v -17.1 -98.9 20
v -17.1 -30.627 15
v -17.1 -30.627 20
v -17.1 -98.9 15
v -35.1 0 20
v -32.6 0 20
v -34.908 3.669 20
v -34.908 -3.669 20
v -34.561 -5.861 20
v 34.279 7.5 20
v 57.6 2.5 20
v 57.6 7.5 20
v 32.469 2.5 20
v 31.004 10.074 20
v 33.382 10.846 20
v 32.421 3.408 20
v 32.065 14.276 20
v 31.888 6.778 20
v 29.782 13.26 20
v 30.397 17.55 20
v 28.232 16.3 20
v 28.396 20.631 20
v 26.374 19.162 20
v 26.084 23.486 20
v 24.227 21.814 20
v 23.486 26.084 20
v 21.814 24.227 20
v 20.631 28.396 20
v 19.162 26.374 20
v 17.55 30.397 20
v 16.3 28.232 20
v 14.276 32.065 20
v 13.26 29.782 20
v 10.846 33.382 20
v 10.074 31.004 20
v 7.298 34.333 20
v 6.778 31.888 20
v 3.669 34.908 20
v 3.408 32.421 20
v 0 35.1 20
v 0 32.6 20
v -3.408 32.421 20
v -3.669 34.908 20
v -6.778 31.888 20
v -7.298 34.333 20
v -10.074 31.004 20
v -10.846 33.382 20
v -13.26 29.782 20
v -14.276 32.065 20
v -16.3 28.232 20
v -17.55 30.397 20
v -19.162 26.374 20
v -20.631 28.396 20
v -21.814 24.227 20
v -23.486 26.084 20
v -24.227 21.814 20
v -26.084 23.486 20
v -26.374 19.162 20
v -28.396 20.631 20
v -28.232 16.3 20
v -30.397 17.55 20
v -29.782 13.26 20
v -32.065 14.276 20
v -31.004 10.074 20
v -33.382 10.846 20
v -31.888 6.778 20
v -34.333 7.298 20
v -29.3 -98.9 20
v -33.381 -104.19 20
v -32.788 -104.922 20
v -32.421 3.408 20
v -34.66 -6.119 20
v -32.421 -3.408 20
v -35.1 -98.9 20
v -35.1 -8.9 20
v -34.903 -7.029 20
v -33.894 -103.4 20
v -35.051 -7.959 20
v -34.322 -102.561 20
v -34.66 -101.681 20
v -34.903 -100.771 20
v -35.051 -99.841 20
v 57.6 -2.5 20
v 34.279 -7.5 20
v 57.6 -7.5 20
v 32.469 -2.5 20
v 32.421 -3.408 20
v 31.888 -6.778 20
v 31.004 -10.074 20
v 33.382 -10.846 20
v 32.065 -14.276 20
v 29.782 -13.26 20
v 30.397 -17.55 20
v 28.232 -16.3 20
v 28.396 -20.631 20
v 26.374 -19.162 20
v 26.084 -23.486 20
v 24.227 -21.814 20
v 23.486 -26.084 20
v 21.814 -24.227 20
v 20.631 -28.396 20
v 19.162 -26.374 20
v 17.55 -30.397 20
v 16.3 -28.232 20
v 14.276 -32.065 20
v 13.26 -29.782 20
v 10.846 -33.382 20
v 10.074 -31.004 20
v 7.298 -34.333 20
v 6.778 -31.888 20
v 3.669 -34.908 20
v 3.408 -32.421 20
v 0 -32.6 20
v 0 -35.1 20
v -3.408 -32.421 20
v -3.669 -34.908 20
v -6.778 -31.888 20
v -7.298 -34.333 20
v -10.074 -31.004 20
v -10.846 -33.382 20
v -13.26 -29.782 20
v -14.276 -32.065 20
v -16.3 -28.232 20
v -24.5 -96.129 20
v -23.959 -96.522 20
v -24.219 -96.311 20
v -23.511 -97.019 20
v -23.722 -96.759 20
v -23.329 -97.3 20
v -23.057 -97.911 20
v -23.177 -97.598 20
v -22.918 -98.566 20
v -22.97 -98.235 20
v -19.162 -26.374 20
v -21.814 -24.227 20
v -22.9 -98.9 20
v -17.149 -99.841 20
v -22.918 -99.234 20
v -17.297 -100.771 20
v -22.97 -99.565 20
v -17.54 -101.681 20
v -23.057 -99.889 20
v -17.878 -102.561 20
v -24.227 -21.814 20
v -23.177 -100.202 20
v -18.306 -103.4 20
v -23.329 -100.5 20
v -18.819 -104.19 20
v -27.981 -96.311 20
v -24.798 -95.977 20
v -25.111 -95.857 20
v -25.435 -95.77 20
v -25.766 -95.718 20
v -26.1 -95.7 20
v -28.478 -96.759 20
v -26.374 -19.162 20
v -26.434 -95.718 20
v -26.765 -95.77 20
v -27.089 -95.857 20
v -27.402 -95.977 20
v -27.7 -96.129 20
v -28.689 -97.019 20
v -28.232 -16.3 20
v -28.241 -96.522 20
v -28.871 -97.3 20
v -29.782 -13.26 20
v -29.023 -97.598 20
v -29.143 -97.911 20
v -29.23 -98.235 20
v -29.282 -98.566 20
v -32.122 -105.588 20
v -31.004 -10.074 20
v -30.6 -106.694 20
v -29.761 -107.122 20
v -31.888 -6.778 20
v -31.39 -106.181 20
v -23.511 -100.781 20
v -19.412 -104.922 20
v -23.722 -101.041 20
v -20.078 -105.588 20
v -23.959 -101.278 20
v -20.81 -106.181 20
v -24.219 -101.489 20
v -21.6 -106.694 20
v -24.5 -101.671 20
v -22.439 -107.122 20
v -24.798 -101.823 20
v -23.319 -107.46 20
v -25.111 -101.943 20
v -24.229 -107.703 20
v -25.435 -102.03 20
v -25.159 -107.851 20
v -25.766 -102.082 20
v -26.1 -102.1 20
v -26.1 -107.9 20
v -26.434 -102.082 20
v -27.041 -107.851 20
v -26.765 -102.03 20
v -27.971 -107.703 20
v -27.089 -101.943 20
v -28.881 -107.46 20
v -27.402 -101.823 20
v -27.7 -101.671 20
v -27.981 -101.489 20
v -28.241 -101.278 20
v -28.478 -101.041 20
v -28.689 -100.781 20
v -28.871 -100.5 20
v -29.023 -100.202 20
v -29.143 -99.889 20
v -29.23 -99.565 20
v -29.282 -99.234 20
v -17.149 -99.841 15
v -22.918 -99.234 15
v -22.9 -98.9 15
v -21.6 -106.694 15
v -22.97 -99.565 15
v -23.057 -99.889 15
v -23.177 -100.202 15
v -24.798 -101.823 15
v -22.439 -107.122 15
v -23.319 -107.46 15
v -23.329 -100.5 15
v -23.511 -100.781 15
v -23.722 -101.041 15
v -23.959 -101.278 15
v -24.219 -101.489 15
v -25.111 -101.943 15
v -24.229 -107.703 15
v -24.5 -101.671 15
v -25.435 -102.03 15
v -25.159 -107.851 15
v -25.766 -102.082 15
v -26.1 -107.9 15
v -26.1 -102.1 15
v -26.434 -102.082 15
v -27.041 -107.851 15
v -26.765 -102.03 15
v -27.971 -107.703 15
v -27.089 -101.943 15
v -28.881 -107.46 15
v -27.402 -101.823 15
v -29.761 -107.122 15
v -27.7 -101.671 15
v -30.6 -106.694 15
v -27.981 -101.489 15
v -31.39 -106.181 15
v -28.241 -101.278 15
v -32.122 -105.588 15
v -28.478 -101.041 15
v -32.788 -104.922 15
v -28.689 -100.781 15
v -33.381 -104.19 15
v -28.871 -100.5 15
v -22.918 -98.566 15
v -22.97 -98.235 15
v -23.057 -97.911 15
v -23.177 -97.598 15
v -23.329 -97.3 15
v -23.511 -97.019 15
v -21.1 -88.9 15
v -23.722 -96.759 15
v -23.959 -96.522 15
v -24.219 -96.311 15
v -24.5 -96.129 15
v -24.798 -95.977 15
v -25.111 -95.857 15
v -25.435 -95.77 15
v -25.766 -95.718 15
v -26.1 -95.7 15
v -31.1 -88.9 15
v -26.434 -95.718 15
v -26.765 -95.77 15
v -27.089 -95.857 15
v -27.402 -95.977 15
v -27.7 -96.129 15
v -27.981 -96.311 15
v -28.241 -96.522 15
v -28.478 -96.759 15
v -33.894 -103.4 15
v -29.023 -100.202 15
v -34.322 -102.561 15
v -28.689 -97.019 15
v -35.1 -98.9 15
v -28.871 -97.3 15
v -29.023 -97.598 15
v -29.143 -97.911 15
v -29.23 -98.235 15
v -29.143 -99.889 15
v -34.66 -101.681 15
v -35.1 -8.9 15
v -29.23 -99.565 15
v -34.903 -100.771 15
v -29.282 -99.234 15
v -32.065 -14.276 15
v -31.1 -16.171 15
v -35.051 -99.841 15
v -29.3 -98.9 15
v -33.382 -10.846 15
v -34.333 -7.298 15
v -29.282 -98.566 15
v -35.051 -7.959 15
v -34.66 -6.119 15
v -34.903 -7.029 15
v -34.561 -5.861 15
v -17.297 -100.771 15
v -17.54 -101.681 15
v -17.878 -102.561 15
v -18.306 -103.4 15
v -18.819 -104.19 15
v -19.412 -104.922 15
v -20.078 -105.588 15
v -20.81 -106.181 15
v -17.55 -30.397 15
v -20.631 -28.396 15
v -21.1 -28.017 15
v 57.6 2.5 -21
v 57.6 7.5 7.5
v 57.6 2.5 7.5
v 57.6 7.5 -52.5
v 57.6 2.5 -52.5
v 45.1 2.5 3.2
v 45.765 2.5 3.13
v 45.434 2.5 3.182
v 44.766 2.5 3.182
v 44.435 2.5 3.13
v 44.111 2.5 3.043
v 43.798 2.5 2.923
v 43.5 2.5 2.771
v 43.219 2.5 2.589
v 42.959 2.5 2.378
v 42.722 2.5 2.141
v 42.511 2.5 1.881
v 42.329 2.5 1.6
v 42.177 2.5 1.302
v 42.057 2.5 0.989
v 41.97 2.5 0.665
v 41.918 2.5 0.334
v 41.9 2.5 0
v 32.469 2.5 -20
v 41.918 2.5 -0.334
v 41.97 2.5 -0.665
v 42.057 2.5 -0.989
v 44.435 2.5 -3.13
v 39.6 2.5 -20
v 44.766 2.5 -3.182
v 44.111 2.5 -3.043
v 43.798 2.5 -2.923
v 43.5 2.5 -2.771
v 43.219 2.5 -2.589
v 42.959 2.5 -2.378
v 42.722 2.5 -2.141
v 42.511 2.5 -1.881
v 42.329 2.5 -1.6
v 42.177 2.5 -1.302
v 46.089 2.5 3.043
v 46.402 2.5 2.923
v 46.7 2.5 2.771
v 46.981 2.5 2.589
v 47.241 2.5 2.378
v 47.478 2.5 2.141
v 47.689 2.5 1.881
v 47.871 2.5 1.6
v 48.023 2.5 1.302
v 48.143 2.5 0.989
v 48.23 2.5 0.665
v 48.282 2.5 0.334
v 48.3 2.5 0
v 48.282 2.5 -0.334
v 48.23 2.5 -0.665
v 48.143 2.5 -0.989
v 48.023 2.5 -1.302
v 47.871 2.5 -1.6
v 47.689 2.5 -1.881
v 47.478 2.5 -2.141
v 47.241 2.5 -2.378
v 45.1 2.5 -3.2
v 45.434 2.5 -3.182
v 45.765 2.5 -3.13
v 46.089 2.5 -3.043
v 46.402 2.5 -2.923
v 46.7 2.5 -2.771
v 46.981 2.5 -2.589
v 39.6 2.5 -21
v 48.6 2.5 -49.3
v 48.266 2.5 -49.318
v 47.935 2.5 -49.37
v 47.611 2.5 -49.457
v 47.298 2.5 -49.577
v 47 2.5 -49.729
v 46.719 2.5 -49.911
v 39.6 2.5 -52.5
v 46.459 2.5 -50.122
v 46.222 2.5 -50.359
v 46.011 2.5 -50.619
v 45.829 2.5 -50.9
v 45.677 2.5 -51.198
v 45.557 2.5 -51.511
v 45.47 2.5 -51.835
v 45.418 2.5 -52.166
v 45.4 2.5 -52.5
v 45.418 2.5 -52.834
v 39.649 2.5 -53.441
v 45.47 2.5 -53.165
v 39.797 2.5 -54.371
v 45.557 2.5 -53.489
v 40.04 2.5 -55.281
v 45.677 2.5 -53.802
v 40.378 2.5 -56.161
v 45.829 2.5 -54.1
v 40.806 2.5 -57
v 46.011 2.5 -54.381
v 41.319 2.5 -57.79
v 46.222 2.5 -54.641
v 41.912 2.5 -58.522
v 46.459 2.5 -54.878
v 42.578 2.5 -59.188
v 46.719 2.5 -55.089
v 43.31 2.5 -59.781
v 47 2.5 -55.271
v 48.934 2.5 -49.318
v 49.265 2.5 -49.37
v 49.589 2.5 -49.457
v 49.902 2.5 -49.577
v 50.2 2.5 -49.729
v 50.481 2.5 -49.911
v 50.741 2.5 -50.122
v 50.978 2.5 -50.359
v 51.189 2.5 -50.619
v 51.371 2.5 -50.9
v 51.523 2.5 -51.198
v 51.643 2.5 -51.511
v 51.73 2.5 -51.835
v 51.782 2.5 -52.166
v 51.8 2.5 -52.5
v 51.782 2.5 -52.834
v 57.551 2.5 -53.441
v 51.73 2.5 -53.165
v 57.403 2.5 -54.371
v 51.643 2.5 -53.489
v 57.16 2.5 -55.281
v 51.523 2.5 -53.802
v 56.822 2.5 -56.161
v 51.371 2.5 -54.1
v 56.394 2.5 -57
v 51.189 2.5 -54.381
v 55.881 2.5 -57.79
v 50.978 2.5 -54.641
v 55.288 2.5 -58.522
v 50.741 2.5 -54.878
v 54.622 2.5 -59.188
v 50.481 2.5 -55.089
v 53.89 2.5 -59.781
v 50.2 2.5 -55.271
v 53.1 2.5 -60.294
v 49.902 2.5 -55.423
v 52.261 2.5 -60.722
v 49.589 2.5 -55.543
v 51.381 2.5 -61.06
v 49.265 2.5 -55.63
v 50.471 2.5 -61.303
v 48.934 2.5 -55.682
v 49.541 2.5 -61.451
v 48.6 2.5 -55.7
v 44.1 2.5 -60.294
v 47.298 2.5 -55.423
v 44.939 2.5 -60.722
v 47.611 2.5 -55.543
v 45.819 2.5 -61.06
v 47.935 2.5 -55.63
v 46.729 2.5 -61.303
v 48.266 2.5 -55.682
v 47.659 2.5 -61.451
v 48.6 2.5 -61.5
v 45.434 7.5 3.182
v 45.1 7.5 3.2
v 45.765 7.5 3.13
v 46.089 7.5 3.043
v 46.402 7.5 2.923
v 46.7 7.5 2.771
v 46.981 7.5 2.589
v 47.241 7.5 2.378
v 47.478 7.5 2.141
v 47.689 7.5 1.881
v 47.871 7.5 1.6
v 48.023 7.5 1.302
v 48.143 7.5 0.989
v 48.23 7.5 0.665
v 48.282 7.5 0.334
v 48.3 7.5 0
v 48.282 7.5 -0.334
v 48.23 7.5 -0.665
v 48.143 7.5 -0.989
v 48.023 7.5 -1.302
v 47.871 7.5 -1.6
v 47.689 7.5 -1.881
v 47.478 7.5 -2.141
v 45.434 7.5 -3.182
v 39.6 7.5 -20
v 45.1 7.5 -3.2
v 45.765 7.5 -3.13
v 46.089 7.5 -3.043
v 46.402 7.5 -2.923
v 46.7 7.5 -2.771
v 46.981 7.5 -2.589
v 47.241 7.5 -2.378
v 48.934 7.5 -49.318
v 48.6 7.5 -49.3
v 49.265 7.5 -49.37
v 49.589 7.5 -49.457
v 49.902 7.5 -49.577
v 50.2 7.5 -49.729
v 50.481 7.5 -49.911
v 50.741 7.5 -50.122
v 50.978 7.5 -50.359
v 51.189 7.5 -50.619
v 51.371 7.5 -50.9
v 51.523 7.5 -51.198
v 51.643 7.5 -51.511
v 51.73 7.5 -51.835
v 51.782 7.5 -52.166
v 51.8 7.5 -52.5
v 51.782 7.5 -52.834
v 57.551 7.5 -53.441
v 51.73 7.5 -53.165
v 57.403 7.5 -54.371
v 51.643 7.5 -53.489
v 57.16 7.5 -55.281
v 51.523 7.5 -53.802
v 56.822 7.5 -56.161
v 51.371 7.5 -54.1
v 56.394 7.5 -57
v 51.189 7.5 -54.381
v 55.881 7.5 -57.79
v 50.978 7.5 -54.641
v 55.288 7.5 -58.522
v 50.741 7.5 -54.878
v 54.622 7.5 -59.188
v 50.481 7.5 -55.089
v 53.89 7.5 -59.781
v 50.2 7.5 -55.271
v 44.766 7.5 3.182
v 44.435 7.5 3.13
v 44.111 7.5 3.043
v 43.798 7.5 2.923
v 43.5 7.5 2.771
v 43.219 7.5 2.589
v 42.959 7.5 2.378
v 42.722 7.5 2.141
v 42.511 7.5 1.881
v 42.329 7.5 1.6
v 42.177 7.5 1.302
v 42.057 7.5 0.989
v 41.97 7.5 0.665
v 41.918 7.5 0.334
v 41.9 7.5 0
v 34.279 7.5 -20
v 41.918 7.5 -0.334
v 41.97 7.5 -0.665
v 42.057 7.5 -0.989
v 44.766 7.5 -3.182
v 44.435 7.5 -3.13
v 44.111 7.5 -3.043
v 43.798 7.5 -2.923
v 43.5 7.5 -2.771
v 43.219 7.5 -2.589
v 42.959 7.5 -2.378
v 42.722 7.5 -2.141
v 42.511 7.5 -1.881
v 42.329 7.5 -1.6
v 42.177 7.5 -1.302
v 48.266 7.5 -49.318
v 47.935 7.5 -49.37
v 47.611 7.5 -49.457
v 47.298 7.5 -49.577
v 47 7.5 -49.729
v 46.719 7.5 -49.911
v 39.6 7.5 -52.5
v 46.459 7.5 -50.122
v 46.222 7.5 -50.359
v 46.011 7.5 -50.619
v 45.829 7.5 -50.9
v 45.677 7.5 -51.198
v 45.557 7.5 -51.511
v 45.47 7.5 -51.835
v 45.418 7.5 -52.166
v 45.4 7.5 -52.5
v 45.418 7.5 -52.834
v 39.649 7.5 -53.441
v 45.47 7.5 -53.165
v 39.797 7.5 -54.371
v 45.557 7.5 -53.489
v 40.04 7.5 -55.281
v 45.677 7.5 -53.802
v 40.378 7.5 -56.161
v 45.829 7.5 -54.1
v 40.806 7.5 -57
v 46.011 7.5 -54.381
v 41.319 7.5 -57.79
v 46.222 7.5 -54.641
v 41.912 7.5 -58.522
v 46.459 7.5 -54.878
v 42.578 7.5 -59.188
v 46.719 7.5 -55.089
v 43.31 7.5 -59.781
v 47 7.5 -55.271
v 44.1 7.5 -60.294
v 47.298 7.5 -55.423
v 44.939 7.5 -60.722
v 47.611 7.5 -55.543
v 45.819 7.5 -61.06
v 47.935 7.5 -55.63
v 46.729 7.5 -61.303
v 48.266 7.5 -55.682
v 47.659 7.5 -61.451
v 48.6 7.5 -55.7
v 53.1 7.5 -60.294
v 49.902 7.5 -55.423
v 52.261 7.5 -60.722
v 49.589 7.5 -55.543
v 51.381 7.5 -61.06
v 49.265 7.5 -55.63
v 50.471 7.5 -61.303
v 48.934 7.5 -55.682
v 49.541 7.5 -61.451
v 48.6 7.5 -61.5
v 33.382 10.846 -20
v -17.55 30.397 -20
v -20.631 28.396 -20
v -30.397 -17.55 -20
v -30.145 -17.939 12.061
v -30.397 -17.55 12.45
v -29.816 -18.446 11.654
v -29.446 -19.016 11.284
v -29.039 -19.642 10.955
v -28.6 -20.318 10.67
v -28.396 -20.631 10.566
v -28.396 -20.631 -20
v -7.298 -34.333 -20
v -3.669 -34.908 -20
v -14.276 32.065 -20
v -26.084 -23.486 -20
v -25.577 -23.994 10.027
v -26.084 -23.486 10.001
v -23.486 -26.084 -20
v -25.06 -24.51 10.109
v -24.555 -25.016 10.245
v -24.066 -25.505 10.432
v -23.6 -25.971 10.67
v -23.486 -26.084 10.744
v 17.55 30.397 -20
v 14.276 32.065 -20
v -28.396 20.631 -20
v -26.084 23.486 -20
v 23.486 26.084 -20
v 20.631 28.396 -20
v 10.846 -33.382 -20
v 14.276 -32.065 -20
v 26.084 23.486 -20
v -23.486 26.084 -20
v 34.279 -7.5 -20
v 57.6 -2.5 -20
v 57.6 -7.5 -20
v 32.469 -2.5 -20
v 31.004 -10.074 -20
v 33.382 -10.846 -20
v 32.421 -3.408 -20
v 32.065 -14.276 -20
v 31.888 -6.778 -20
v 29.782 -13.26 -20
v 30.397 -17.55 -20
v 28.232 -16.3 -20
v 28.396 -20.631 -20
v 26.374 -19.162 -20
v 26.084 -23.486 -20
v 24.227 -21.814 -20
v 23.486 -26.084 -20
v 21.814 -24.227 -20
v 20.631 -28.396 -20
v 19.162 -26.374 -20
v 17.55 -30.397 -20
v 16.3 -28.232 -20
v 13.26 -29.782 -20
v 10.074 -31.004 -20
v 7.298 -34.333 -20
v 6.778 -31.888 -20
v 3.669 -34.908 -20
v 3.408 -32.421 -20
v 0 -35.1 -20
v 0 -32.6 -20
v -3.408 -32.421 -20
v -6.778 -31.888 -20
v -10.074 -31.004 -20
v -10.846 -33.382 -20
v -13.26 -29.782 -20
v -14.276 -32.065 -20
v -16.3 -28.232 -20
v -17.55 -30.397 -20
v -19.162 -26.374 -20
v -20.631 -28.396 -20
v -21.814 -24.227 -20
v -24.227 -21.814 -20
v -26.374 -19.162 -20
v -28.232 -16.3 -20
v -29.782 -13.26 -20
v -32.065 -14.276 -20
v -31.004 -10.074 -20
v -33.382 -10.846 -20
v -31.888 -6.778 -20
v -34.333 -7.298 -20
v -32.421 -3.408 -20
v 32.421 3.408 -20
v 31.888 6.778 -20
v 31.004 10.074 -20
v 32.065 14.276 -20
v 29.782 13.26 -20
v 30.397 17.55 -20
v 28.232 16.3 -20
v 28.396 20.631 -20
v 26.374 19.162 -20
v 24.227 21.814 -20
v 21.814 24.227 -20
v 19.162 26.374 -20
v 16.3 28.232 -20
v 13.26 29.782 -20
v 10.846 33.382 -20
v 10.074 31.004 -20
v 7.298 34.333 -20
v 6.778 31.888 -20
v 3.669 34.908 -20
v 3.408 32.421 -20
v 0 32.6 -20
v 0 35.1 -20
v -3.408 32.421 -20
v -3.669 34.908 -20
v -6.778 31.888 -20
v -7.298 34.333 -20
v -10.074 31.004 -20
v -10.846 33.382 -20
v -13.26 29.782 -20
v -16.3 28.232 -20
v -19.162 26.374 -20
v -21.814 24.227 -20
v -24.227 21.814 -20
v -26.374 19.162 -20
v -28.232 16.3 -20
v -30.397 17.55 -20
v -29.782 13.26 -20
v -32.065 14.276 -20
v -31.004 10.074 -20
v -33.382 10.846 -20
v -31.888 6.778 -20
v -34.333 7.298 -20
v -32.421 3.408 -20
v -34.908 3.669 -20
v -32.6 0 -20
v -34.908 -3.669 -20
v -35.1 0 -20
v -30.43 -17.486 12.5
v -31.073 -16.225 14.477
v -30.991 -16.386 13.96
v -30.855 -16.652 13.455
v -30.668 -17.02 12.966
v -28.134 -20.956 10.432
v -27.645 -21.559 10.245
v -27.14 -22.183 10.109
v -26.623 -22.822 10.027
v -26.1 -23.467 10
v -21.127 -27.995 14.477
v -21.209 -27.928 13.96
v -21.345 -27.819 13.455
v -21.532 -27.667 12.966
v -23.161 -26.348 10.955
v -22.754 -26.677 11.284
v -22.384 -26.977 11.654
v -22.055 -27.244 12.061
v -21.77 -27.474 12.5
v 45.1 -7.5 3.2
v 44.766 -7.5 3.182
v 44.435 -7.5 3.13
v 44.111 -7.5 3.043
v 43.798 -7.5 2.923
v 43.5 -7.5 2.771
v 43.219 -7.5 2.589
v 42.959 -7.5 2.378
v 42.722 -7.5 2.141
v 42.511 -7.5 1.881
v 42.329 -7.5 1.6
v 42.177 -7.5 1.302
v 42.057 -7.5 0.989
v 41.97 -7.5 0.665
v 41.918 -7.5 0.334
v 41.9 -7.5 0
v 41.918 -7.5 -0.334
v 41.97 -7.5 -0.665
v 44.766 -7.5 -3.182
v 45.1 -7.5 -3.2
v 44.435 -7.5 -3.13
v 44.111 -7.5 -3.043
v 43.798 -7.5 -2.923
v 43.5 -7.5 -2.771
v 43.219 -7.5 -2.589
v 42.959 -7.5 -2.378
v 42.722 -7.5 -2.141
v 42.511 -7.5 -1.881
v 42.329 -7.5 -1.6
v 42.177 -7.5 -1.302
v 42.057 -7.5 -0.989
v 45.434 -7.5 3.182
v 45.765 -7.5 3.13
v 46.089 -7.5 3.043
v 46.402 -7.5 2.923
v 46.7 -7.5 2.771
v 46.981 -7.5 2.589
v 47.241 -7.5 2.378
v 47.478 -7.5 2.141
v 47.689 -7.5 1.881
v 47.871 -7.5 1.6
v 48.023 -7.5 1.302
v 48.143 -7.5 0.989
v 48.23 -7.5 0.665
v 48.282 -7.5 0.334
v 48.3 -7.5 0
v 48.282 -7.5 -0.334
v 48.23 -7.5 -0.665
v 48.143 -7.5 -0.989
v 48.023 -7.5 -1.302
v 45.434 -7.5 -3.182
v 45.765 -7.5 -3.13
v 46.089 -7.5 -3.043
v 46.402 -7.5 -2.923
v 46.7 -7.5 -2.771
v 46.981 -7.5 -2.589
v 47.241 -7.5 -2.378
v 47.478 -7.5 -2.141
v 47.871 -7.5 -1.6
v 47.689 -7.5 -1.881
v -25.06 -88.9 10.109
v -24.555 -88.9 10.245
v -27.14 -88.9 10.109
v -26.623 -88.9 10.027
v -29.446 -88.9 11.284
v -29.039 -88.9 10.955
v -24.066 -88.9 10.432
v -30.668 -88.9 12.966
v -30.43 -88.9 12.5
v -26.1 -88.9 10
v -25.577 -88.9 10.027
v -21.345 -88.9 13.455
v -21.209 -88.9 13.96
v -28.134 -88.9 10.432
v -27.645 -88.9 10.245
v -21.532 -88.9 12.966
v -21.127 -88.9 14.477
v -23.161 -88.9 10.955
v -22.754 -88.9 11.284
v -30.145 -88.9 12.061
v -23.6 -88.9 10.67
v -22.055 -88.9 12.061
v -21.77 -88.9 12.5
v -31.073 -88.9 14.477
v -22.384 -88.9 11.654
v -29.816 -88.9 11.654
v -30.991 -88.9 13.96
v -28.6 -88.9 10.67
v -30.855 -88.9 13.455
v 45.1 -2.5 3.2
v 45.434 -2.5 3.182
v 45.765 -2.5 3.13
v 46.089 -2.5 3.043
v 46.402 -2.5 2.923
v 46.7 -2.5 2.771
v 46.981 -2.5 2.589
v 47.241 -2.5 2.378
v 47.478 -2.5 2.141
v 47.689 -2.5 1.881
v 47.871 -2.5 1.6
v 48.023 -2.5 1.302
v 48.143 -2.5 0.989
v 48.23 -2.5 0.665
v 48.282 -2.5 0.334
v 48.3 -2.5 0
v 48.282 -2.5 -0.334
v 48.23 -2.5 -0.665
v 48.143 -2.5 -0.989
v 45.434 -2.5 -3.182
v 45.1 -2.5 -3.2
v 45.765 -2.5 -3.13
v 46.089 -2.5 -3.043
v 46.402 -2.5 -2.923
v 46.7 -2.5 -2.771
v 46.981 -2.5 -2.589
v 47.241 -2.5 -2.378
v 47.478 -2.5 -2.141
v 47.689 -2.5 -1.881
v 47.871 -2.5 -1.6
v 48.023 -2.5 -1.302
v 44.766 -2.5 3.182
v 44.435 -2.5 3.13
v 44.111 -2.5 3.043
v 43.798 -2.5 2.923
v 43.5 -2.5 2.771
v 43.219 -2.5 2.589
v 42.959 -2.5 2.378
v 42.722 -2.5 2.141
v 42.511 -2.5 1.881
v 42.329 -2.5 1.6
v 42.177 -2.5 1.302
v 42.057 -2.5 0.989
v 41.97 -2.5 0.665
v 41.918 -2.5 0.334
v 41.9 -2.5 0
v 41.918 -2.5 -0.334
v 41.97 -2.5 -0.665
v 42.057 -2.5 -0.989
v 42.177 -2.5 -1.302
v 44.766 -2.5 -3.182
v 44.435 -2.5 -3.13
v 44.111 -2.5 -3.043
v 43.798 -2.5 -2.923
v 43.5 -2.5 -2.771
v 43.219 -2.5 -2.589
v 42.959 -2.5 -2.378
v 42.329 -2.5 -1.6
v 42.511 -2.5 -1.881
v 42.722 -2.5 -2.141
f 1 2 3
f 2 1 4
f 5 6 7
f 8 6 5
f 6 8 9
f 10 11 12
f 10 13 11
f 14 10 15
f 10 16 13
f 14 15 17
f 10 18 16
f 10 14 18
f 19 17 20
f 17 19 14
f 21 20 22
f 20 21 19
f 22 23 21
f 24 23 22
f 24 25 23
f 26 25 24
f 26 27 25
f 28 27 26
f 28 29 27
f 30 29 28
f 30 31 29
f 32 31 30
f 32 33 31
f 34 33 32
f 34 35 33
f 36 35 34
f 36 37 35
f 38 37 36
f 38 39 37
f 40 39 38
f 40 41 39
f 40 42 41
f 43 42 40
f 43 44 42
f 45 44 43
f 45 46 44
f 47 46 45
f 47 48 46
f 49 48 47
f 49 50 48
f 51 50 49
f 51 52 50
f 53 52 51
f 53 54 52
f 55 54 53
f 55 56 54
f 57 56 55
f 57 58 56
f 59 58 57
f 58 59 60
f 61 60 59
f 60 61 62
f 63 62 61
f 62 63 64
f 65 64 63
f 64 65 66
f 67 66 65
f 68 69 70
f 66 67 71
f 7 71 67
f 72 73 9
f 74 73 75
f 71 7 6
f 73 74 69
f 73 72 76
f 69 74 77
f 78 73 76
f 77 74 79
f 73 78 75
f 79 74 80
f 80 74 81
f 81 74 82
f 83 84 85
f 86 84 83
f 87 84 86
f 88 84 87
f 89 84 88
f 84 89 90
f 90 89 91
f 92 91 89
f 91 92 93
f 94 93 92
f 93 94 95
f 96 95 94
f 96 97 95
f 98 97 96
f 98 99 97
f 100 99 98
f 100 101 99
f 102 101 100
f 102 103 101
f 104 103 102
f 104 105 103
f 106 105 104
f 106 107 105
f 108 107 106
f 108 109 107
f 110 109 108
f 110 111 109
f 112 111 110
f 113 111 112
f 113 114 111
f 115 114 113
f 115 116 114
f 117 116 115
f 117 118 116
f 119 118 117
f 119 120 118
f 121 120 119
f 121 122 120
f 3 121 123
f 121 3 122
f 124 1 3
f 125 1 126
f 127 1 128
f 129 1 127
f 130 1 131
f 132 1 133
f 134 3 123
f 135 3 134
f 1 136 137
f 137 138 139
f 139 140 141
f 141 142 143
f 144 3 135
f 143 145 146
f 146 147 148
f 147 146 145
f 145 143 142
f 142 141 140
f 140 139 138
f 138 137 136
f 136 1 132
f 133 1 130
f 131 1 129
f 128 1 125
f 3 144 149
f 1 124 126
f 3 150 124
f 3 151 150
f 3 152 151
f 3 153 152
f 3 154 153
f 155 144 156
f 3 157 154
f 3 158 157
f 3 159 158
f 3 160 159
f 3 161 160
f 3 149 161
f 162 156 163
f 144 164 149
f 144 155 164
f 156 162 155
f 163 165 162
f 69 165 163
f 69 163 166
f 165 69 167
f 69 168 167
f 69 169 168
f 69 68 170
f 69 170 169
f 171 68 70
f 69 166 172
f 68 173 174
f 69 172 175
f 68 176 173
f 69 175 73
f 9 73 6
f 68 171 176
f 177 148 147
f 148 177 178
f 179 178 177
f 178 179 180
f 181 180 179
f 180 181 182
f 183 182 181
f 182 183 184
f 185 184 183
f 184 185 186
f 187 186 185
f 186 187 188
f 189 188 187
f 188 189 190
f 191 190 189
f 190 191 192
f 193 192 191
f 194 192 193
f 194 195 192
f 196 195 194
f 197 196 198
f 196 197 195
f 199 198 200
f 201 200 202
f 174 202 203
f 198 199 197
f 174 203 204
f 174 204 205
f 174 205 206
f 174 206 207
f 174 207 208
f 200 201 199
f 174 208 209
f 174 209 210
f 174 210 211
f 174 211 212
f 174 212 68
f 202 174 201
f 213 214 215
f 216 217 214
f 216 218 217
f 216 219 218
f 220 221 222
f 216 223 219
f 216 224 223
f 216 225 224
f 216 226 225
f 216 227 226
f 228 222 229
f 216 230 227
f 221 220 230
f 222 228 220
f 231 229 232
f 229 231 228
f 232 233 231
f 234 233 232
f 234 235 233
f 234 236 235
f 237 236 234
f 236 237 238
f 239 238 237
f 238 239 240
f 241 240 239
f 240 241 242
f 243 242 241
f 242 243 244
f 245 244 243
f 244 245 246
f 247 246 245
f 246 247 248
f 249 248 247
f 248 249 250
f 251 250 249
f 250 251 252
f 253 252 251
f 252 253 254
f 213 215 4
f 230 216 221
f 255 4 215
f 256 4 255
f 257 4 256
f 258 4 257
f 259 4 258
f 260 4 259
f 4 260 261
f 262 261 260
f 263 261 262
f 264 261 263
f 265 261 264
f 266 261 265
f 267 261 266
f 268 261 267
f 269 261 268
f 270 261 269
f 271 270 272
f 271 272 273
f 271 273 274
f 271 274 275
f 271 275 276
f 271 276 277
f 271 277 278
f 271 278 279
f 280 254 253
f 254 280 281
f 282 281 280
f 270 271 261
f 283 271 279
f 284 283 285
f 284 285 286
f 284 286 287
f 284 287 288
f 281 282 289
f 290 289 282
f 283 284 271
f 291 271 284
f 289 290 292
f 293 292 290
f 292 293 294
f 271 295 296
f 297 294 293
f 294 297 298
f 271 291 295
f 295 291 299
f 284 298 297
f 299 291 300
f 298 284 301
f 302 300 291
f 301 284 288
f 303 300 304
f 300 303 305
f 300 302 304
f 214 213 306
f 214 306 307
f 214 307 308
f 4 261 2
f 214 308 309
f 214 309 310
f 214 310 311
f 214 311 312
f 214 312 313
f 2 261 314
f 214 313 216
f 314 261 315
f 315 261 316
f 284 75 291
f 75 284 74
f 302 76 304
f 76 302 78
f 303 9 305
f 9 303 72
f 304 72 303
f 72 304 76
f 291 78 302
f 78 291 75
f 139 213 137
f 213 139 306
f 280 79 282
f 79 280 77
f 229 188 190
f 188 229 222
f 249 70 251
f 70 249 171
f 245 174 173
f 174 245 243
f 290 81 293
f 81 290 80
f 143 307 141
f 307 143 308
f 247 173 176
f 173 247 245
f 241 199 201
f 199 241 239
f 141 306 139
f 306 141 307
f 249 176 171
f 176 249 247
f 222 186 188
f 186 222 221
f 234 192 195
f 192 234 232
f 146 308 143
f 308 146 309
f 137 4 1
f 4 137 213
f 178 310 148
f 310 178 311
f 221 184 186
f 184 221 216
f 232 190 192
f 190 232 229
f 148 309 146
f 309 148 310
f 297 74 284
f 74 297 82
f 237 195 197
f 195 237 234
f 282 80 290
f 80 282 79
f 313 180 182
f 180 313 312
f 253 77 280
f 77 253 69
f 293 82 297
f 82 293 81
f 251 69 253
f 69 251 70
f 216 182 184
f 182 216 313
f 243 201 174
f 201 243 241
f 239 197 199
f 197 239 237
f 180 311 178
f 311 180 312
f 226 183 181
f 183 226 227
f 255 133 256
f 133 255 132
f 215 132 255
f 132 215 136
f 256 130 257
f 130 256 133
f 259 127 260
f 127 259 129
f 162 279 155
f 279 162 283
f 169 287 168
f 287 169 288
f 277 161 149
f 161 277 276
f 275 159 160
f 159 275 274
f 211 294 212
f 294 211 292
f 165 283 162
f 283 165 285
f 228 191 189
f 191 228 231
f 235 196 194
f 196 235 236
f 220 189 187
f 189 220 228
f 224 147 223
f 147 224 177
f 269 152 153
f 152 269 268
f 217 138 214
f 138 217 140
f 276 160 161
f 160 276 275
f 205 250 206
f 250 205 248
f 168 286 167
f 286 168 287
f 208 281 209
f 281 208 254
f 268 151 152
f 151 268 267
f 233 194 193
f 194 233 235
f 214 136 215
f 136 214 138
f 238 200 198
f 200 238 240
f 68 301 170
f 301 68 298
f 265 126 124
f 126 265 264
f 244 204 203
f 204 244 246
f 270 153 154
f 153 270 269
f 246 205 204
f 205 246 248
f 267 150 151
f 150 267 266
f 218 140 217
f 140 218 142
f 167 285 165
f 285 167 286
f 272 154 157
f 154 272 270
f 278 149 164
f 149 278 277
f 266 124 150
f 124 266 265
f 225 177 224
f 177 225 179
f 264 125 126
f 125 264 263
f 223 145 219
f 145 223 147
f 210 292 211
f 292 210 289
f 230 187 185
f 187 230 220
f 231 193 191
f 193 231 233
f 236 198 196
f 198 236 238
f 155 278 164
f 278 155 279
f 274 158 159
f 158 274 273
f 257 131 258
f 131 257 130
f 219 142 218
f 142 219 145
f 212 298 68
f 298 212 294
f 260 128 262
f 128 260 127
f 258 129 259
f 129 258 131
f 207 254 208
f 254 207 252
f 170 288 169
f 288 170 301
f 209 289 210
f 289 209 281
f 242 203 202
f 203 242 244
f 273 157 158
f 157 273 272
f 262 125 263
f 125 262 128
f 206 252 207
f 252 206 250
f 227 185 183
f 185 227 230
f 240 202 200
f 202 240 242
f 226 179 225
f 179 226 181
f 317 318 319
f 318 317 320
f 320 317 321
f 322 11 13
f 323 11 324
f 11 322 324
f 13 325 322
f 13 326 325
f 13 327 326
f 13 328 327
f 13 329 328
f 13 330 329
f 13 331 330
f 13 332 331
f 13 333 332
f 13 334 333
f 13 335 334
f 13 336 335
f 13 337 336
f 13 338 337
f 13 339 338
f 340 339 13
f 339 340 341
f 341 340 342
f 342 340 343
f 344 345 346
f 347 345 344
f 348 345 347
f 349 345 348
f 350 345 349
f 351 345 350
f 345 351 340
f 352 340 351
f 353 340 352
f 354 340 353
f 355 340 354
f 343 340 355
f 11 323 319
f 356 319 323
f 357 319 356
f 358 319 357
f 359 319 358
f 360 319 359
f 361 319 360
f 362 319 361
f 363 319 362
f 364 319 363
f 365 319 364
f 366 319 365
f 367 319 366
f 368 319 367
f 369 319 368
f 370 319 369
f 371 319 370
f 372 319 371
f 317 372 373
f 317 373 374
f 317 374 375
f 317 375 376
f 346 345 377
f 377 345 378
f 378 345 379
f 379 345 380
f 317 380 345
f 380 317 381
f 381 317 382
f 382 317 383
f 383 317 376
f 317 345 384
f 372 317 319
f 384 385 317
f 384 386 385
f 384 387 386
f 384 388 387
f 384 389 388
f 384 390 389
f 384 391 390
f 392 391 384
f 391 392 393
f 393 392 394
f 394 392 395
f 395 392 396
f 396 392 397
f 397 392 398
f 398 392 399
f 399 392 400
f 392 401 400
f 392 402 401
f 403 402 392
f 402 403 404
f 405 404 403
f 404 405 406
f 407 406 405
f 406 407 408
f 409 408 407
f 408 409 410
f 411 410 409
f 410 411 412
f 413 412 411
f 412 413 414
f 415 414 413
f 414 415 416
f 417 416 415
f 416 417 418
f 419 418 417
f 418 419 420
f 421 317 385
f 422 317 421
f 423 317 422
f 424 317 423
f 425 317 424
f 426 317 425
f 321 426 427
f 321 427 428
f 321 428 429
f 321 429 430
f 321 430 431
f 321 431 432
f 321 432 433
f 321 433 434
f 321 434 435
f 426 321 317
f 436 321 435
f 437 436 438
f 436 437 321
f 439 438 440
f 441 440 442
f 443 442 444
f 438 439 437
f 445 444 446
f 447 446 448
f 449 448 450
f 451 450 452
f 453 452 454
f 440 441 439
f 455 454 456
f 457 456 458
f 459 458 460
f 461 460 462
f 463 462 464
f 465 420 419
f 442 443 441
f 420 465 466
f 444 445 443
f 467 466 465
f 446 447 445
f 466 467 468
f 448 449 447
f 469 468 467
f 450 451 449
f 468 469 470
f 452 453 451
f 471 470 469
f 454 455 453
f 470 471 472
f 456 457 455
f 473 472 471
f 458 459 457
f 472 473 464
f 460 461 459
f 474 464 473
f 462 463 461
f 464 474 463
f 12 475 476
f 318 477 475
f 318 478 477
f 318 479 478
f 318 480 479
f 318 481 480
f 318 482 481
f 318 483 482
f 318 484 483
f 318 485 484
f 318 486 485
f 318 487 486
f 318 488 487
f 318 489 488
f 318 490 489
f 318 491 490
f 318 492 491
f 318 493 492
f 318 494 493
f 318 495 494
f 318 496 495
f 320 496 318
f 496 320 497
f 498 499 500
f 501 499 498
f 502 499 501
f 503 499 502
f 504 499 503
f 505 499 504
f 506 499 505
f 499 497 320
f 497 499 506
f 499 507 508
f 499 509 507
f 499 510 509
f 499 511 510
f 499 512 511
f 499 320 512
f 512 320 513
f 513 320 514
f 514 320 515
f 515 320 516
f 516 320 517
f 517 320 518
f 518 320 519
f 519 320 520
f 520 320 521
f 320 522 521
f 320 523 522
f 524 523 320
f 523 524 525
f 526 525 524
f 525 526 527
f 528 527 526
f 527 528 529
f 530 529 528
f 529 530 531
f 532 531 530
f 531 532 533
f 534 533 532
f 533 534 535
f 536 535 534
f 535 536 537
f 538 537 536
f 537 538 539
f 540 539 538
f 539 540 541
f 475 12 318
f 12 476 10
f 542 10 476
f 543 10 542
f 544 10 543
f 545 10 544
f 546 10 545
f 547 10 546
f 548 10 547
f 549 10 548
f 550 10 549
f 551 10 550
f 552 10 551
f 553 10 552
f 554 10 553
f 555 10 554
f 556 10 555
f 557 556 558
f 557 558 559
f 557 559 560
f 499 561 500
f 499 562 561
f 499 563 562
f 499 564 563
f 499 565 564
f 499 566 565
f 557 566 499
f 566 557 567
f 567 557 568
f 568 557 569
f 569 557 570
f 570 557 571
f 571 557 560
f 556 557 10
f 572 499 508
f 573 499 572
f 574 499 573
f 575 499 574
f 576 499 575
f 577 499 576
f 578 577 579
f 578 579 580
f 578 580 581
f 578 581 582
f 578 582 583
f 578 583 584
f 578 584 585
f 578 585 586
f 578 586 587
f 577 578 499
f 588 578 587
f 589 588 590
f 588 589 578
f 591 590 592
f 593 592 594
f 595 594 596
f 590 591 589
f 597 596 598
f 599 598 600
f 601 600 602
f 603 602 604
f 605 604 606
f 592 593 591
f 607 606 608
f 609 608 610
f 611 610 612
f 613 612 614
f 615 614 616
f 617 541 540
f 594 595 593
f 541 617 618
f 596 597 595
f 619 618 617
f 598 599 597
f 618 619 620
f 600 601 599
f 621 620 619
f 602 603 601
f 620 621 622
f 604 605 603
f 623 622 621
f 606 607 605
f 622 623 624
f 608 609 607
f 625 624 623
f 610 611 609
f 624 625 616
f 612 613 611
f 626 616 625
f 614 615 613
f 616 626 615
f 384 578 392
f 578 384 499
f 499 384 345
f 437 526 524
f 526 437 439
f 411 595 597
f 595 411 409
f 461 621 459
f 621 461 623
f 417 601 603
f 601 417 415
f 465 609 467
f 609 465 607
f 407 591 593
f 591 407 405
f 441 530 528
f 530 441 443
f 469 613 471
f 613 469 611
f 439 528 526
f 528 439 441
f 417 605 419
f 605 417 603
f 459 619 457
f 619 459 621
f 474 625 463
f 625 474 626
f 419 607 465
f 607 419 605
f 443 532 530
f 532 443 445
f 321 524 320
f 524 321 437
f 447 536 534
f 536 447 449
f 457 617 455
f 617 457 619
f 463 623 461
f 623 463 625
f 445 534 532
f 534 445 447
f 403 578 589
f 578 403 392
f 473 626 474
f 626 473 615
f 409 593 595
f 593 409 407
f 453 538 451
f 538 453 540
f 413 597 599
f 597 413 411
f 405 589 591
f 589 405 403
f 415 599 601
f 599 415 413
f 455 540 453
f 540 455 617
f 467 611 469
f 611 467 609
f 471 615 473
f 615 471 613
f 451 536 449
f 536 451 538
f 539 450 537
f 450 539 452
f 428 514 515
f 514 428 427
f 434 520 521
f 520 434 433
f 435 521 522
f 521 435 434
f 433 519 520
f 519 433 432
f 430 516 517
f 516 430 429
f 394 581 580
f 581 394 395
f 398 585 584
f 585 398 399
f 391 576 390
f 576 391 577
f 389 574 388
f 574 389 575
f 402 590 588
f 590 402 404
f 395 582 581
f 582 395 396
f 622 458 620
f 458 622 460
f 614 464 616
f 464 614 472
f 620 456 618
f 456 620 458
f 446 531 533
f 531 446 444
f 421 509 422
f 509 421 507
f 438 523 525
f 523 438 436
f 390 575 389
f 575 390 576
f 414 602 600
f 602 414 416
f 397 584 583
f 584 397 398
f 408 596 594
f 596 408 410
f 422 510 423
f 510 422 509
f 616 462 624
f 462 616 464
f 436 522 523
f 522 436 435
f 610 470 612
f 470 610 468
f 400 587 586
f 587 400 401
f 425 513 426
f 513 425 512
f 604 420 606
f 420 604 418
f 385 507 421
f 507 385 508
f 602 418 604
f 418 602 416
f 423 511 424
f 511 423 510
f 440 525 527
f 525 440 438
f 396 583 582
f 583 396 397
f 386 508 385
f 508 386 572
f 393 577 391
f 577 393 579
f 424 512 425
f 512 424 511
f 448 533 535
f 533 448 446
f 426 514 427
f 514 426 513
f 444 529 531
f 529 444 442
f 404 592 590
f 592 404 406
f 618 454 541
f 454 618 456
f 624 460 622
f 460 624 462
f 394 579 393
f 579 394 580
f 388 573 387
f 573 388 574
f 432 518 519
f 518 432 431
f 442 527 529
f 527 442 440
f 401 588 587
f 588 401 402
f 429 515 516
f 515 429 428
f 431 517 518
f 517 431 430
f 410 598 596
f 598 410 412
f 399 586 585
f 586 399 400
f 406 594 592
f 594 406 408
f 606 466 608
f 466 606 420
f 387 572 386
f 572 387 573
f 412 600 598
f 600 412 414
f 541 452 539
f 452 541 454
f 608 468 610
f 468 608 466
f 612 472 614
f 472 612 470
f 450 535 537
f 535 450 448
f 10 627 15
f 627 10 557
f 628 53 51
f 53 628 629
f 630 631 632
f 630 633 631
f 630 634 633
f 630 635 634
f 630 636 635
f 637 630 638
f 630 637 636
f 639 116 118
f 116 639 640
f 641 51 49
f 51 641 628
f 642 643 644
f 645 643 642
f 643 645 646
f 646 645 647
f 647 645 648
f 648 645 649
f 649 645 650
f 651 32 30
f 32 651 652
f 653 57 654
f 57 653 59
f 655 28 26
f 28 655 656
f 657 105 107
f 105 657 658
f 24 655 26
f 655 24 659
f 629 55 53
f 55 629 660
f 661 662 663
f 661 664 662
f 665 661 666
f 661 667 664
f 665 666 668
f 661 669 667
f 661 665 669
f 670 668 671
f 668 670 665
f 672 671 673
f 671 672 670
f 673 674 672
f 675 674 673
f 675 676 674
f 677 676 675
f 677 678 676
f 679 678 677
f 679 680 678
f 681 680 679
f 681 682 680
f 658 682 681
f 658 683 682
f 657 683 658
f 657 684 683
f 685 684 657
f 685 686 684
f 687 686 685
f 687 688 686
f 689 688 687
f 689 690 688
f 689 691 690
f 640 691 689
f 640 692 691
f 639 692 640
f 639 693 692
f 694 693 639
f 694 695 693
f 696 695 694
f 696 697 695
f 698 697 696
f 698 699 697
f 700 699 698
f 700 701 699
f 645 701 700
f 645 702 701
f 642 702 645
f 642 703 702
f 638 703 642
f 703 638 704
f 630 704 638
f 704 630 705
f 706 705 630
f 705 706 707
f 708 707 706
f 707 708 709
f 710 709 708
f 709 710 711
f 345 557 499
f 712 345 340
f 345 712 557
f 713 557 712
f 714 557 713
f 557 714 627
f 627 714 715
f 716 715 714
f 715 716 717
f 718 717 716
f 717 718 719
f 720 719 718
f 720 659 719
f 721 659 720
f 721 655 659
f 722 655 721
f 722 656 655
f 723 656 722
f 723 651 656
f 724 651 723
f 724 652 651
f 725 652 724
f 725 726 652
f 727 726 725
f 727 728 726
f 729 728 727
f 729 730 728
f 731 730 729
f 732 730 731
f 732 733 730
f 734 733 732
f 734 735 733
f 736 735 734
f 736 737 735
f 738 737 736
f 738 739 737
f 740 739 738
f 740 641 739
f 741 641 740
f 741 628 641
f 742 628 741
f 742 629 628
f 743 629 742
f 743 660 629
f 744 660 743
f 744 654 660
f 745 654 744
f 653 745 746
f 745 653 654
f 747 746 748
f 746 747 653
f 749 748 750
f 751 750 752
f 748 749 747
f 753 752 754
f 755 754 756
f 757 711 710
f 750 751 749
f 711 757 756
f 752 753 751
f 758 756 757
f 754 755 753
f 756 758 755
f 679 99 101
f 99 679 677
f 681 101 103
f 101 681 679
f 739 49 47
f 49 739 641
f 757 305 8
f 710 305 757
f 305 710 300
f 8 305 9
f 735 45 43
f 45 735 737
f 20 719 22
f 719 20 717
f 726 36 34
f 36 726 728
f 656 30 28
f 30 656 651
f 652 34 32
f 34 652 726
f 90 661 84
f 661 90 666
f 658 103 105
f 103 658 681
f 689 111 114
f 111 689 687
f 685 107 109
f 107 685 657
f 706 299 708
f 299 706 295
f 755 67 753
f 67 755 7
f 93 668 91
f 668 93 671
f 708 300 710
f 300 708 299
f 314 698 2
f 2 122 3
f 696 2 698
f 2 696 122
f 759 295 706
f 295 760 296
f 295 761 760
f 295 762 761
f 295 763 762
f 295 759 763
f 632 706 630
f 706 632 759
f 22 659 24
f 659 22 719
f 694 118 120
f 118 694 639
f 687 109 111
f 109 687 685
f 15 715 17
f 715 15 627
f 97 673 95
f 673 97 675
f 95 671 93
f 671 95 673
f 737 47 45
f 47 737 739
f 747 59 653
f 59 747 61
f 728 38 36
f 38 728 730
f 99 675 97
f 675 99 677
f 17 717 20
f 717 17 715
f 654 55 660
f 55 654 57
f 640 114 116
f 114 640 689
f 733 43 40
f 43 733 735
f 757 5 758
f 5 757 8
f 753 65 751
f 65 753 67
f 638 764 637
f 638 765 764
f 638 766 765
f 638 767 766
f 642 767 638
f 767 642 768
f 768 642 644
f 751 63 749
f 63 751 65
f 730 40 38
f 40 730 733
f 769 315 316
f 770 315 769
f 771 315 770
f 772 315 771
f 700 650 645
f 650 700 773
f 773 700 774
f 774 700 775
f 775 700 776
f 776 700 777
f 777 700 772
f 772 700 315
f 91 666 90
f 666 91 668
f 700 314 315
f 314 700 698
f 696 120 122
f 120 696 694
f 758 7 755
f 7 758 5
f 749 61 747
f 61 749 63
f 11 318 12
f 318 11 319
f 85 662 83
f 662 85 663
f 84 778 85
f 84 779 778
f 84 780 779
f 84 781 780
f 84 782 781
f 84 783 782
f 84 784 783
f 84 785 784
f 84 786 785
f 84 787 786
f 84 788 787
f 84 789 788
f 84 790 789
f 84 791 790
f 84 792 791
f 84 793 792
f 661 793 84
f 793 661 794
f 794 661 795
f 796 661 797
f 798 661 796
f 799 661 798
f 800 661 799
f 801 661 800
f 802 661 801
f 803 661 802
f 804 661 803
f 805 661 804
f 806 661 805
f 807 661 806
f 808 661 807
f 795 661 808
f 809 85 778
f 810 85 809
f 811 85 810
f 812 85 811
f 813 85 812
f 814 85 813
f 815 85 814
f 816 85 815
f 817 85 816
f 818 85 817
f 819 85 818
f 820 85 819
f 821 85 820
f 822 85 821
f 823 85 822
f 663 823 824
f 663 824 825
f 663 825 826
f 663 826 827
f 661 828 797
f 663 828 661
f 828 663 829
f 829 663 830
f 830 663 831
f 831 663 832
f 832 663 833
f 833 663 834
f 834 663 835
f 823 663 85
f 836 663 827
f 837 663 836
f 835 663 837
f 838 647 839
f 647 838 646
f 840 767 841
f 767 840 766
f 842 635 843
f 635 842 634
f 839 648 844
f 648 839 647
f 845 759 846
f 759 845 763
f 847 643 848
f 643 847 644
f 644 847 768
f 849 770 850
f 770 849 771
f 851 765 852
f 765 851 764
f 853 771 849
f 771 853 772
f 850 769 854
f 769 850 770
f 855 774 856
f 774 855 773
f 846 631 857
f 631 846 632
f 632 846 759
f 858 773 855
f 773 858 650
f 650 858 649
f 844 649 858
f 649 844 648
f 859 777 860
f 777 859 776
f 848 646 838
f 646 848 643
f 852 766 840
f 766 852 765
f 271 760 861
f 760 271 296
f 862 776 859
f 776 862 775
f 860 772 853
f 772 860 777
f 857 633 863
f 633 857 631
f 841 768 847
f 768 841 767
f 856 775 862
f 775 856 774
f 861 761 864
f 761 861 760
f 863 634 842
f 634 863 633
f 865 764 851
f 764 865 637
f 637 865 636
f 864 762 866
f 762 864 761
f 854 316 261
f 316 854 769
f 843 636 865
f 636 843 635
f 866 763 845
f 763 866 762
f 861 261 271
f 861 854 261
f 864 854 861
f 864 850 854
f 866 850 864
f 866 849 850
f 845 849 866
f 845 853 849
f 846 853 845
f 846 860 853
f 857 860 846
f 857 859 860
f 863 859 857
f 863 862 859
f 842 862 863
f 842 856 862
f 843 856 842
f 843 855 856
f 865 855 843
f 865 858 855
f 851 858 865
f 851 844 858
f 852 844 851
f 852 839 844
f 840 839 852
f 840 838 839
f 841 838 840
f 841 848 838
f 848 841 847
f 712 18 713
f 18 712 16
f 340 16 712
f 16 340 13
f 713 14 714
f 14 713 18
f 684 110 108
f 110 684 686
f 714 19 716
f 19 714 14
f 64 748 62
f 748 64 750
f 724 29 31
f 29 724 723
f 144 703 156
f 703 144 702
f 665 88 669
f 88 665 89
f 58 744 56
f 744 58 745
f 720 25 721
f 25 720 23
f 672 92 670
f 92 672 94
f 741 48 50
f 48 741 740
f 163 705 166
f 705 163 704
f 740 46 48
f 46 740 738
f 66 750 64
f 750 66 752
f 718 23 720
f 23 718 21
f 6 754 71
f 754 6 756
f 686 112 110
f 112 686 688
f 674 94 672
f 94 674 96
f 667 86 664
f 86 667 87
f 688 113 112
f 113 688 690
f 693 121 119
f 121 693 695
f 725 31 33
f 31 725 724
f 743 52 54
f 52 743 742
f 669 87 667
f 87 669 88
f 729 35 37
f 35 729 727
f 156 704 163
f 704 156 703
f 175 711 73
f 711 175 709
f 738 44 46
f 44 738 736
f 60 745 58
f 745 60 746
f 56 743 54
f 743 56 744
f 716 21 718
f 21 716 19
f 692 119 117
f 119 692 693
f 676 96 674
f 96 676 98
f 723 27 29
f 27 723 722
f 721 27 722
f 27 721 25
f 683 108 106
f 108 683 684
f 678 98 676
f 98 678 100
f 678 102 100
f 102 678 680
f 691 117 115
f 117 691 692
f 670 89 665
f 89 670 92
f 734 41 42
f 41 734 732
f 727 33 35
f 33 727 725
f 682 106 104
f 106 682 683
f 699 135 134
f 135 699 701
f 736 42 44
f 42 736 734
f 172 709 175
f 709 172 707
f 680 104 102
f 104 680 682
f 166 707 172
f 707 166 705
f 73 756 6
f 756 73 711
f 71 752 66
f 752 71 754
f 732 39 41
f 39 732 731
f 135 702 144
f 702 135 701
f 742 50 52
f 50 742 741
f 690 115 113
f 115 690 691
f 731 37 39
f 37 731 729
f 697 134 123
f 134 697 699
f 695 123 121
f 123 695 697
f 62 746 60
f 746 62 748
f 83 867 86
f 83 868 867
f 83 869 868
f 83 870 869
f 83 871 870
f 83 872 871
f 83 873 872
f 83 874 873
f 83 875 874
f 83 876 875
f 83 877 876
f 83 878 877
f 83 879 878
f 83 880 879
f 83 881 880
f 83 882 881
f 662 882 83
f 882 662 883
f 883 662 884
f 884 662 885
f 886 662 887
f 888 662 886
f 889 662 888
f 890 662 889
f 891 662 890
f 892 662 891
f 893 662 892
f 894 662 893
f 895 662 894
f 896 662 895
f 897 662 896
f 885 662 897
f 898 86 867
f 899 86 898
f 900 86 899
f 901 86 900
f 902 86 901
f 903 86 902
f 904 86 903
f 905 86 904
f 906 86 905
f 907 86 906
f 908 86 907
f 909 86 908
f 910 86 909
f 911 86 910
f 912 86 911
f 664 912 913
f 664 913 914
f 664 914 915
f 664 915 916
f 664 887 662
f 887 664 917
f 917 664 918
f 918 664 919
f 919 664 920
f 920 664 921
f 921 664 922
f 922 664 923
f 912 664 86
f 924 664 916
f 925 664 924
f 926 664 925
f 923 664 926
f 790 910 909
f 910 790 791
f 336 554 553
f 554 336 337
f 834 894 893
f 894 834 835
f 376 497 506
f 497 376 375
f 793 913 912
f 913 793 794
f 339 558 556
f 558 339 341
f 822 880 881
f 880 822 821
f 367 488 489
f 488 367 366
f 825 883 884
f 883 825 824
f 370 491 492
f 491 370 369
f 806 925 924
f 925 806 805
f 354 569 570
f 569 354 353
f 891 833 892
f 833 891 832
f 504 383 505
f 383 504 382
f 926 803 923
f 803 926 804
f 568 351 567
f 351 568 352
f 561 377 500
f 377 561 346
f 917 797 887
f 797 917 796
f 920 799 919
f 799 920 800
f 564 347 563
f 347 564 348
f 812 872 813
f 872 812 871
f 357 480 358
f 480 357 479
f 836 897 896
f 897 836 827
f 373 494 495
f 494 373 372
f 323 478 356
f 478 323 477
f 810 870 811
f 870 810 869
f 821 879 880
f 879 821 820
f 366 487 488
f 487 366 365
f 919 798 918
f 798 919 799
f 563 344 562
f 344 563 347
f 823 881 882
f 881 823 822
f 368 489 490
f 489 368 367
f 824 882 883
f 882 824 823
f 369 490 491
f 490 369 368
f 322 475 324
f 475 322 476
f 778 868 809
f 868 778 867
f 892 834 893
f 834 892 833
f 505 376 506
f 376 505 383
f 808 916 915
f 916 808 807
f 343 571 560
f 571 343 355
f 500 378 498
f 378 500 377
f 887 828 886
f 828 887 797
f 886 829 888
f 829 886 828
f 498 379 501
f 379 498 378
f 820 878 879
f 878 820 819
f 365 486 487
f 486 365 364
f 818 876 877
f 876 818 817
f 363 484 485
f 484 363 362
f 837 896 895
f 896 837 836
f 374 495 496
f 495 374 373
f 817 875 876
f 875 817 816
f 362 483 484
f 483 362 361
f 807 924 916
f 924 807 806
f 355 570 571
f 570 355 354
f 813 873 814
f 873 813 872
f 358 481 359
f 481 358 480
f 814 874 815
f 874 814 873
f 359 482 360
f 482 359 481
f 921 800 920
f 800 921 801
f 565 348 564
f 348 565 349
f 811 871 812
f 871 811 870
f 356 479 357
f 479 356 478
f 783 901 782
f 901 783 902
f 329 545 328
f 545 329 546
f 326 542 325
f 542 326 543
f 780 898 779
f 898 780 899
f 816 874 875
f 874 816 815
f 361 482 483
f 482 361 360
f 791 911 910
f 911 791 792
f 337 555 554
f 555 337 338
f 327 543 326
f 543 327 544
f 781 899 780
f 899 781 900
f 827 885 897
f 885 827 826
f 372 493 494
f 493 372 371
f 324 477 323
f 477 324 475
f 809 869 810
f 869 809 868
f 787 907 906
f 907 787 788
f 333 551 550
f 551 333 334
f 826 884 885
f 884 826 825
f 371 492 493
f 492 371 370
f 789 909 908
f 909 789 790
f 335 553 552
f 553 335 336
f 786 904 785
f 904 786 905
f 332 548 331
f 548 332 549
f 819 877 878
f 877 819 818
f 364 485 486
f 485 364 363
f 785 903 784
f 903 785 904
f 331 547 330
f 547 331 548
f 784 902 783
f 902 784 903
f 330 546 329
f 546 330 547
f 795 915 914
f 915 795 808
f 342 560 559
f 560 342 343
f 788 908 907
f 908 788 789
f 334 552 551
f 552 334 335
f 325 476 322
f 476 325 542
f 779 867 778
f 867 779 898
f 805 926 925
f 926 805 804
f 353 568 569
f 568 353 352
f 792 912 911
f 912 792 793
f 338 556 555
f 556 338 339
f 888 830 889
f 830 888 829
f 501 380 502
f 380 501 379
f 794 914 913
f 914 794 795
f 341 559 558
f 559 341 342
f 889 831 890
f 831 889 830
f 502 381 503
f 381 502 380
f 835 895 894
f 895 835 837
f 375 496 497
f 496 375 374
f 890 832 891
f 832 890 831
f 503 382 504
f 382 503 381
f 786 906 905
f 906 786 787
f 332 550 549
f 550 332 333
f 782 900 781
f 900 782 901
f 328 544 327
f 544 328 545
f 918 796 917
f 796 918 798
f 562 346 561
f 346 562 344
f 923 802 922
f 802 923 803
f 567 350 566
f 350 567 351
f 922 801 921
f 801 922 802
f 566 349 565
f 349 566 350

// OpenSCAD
/* Open SCAD Name.: CNC_Indicator_Collar_v1.scad
*  Copyright (c)..: 2017 www.DIY3DTech.com
*
*  Creation Date..: 08/03/2017
*  Description....: Collar CNC Dial Indicator
*
*  Rev 1: Develop Model
*  Rev 2: 
*
*  This program is free software; you can redistribute it and/or modify
*  it under the terms of the GNU General Public License as published by
*  the Free Software Foundation; either version 2 of the License, or
*  (at your option) any later version.
*
*  This program is distributed in the hope that it will be useful,
*  but WITHOUT ANY WARRANTY; without even the implied warranty of
*  MERCHANTABILITY or FITNESS FOR A PARTICULAR PURPOSE.  See the
*  GNU General Public License for more details.
*  This version is for non-comerical use only.
*/ 

/*------------------Customizer View-------------------*/

// preview[view:north, tilt:top]

/*---------------------Parameters---------------------*/

//Dia of Spindle in mm (0.2mm is for contraction)
spindle_dia     =   65.2;//[50.2:1:75.2]

//Wall Thickness in mm
wall_Thick      =    5;//[3:1:5]

//Height of collar in mm
collar_height   =   40;//[40:1:50]

//Lengeth of x/y mount in mm
x_length       =    90;//[100:2:200]

//Lengeth of z mount in mm
z_length        =   20;//[10:1:30]

//Mount width in mm (do not recommend changing)
mount_width     =   18;//[18:1:20]


/*-----------------------Execute----------------------*/

main_module();

/*-----------------------Modules----------------------*/

module main_module(){ //create module
    difference() {
            union() {//start union
                
                //crreate main body of collar
                translate ([0,0,0]) rotate ([0,0,0]) cylinder(collar_height,(spindle_dia+wall_Thick)/2,(spindle_dia+wall_Thick)/2,$fn=60,true);
                
                //create cinch tab
                translate ([spindle_dia/2,0,0]) rotate ([0,0,0]) cube([50,15,collar_height],true);
                
                //create x mounts
                translate ([-((spindle_dia+wall_Thick)/2)+(mount_width/2),-((spindle_dia+wall_Thick))+(spindle_dia/4),(collar_height/2)-2.5]) rotate ([0,0,0]) oblong(mount_width,x_length,5,0,6.4,true);
                
                //create x support
                translate ([-((spindle_dia+wall_Thick)/2)+(mount_width/2),-((spindle_dia+wall_Thick))+(spindle_dia/4)+10,(collar_height/2)-5]) rotate ([90,90,0]) cylinder(x_length,10/2,10/2,$fn=60,true);
                                
                //create z mount
                translate ([(spindle_dia+mount_width+14)/2,5,-z_length-2.5]) rotate ([90,0,0])oblong(18,(z_length+collar_height),5,0,6.4,true);
                
                    } //end union
                            
    //start subtraction of difference
                    
                //Differance center of collar
                translate ([0,0,0]) rotate ([0,0,0]) cylinder(collar_height*2,(spindle_dia)/2,(spindle_dia)/2,$fn=60,true);
                    
                //create opening for cinch
                translate ([spindle_dia/2,0,0]) rotate ([0,0,0]) cube([52,5,collar_height+2],true);
                    
                //create hole for cinch bolt
                translate ([(spindle_dia+25)/2,0,0]) rotate ([90,0,0]) cylinder(20,6.4/2,6.4/2,$fn=60,true);
                                               
    } //end difference
}//end module

module oblong(dia,len,tall,hole_1,hole_2,center){
    difference() {
        union() {
            //create base oblong structure
            cube([dia,len,tall], center);
            translate ([0,len/2,0]) {cylinder(tall,dia/2,dia/2,$fn=60, center);
            }
            translate ([0,-len/2,0]) {cylinder(tall,dia/2,dia/2,$fn=60, center);
            }
        } //end union
     //if hole is greater than zero, remove hole otherwise do nothing   
     if (hole_1>0) {
        translate ([0,len/2,-1]) {cylinder(tall+3,hole_1/2,hole_1/2,$fn=60, center);
        }}
        if (hole_2>0) {
        translate ([0,-len/2,-1]) {cylinder(tall+3,hole_2/2,hole_2/2,$fn=60, center);
        }}
    } //end differance
}//end module

                 
/*----------------------End Code----------------------*/
//translate ([0,0,0]) rotate ([0,0,0]) cylinder(5,3,3,true);
//translate ([0,0,0]) rotate ([0,0,0]) cube([18,18,18],true);
//translate ([0,0,0]) sphere($fn = 0, $fa = 12, $fs = 2, r = 1);
//translate ([0,0,0]) rotate ([0,0,0]) rounded (15,15,1,1,true);
